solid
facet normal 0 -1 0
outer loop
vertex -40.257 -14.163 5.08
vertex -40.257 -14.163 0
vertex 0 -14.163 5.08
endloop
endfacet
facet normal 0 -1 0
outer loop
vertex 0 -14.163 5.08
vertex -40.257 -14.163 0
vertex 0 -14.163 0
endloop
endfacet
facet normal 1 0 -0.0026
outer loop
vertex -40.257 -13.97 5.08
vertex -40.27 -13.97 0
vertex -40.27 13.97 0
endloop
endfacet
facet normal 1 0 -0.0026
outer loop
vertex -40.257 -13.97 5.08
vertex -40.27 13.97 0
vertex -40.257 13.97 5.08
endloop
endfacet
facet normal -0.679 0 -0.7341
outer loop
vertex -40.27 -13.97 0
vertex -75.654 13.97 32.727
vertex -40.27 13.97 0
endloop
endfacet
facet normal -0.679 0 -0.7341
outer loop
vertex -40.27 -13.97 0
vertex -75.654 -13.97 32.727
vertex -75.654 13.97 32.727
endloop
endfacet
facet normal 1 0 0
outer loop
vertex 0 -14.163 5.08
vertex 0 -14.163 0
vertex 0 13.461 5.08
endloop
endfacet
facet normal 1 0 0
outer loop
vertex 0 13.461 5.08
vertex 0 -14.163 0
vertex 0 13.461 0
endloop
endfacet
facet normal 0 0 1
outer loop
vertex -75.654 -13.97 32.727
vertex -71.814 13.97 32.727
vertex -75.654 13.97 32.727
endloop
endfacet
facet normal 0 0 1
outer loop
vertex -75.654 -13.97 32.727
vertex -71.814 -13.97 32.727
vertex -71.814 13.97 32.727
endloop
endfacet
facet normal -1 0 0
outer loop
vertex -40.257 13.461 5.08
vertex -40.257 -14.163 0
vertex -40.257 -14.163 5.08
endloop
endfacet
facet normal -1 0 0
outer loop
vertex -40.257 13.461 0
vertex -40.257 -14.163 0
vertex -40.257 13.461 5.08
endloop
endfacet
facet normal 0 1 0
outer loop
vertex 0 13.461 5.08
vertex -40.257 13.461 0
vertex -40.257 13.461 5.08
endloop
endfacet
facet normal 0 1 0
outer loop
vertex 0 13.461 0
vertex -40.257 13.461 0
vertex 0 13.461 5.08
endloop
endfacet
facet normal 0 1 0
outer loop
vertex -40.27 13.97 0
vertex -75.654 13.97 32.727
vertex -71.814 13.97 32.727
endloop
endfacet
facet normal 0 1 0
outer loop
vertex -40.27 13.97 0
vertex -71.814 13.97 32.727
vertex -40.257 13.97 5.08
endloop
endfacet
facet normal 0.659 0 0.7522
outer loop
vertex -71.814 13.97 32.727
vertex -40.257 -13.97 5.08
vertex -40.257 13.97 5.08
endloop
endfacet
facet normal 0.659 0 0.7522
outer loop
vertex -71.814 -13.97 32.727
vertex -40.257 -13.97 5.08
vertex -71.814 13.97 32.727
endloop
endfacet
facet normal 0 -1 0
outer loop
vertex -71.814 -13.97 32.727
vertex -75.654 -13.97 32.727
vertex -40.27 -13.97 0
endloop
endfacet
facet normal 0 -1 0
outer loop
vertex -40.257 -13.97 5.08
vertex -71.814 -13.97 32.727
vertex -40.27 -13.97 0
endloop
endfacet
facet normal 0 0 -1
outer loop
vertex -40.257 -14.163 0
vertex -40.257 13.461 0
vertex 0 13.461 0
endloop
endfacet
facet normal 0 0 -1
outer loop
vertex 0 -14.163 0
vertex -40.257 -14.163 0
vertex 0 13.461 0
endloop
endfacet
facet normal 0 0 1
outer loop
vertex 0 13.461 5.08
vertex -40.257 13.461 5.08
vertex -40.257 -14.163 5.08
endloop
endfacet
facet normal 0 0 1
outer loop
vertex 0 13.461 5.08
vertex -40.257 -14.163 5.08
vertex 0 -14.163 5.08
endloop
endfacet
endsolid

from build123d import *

# Parameters (mm, degrees)
F0_W     = 40.2566045523
F0_H     = 33.2116987556
F1_DEPTH = 5.08
F3_DEPTH = 13.97
F4_DEPTH = 5.588


with BuildPart() as f1:
    # F0 (on Top) → F1 (new body)
    with BuildSketch(Plane.XY):
        with Locations((-20.1283022761, -3.1450474635)):
            Rectangle(F0_W, F0_H)
    extrude(amount=F1_DEPTH)

    # F4 (cut): a face of the model
    f4_faces = [f1.faces().sort_by_distance(p)[0] for p in [
        (-20.1283022761, -19.7508968413, 2.54),
    ]]
    extrude(f4_faces, amount=-F4_DEPTH, mode=Mode.SUBTRACT)


with BuildPart() as f3:
    # F2 (on Front) → F3 (new body, symmetric)
    with BuildSketch(Plane.XZ):
        Polygon((-75.6542980671, 32.7272824943), (-40.2704589069, 0), (-40.256768465, 5.0800731406), (-71.8138366938, 32.7272824943), align=None)
    extrude(amount=F3_DEPTH, both=True)


solid = Compound([f1.part, f3.part])
